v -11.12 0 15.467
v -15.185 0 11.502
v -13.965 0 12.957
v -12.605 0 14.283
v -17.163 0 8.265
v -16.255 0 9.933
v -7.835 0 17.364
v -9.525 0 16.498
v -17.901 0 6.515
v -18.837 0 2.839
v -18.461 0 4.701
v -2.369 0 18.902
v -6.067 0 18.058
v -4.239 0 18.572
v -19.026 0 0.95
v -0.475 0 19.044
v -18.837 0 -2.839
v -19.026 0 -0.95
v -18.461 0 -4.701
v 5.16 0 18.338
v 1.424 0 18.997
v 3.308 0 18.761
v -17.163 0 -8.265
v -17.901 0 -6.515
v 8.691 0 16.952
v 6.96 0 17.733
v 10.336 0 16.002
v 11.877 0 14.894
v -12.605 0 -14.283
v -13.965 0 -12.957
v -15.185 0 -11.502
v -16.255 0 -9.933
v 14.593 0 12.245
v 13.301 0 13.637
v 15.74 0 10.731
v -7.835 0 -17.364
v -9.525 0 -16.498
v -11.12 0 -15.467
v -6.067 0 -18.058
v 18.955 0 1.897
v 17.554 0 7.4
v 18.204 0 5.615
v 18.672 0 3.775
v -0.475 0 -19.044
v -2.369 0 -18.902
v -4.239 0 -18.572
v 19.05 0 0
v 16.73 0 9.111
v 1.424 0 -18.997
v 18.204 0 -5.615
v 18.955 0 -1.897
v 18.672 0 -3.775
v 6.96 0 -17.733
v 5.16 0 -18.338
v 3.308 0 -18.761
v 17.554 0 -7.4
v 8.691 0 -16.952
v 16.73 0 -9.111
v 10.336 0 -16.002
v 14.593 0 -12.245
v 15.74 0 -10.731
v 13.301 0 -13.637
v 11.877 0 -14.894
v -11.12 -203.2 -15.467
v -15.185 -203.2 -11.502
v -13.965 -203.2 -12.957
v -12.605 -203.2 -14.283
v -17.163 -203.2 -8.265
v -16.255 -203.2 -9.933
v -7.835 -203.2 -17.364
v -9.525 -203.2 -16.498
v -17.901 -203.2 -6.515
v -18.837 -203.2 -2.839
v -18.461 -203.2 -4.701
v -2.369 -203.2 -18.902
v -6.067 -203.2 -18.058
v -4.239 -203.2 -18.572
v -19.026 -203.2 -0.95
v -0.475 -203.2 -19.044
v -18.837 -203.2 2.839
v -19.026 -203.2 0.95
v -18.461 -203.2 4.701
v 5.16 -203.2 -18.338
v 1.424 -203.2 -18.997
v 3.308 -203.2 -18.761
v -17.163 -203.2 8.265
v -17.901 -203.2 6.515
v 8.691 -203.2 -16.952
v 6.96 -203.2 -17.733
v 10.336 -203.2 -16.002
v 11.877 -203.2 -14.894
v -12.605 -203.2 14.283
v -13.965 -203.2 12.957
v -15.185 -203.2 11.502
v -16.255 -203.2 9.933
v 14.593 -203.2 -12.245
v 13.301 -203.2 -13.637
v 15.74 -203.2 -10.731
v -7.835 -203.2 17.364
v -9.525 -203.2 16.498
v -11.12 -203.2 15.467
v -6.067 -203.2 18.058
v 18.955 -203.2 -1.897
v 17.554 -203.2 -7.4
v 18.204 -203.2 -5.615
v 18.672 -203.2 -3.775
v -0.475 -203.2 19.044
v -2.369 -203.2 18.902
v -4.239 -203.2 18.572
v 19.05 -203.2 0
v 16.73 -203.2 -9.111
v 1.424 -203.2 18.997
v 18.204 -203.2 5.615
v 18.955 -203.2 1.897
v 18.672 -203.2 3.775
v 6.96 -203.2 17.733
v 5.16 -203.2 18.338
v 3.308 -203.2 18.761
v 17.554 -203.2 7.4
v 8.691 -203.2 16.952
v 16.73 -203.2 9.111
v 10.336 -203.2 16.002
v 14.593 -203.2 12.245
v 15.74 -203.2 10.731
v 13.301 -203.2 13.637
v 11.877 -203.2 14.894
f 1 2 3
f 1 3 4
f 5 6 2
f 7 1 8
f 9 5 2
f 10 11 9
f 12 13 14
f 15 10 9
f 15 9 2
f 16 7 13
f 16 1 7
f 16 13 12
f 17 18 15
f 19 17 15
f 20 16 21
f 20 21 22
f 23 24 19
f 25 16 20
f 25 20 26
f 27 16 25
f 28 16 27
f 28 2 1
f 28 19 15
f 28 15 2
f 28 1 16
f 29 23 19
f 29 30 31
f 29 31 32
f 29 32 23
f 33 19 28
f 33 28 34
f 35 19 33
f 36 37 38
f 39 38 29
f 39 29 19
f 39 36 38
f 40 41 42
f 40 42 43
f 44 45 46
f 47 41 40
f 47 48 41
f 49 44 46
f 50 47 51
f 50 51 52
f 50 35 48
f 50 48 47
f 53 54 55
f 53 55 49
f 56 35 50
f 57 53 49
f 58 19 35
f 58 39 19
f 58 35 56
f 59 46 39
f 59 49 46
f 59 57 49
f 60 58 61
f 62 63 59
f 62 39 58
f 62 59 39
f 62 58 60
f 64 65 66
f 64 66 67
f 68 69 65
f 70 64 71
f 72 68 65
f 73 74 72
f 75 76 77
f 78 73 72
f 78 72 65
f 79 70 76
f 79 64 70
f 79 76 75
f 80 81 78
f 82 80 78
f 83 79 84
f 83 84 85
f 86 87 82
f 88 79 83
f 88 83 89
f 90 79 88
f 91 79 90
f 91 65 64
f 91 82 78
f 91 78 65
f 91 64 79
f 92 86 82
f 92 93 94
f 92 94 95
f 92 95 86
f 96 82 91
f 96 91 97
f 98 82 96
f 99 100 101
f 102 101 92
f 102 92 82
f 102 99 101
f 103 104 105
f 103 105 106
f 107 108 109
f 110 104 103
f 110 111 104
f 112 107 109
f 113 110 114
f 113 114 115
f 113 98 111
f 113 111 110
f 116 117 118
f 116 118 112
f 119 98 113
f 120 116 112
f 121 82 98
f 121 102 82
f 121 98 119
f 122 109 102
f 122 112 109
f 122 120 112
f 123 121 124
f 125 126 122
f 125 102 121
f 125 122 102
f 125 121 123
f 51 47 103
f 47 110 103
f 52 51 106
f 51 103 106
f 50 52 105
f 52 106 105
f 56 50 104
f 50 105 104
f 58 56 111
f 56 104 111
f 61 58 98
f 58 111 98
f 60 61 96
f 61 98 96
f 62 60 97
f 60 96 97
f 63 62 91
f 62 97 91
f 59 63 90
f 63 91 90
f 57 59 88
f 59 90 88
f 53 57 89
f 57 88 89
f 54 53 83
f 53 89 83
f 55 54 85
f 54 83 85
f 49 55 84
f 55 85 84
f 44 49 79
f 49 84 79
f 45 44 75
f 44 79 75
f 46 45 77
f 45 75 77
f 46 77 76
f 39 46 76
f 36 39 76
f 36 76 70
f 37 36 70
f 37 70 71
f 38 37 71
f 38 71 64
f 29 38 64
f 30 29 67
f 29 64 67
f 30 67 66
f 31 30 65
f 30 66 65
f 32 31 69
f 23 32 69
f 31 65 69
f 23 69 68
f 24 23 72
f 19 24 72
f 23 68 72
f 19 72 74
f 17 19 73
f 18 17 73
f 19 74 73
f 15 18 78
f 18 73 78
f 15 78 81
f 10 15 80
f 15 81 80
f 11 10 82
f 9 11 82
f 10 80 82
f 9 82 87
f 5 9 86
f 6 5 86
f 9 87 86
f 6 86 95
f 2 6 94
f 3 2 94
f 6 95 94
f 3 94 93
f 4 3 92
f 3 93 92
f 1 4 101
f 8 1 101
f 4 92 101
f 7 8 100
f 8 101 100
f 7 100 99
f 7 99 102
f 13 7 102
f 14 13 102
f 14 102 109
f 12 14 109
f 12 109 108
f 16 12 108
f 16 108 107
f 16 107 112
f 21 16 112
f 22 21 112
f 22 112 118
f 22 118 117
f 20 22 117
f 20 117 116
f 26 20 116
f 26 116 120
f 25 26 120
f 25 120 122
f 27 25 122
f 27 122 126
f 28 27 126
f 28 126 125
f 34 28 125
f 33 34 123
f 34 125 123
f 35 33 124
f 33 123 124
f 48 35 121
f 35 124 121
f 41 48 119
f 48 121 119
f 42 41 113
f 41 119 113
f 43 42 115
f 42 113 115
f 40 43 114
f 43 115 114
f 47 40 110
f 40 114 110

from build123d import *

# Parameters (mm, degrees)
F0_R      = 19.05
F0_R_2    = 15.875
F1_DEPTH  = 203.2
F1_FACE_R = 19.05
F2_DEPTH  = 25.4
F2_FACE_R = 19.05
F3_DEPTH  = 25.4


with BuildPart() as f1:
    # F0 (on Front) → F1 (new body)
    with BuildSketch(Plane.XZ):
        Circle(F0_R)
        Circle(F0_R_2, mode=Mode.SUBTRACT)
        Circle(F0_R_2)
    extrude(amount=F1_DEPTH)

    # F1_face (on face) → F2 (cut)
    with BuildSketch(Plane(origin=(0, 0, 0), x_dir=(1, 0, 0), z_dir=(0, 1, 0))):
        Circle(F1_FACE_R)
    extrude(amount=-F2_DEPTH, mode=Mode.SUBTRACT)

    # F2_face (on face) → F3 (join)
    with BuildSketch(Plane(origin=(0, -25.4, 0), x_dir=(1, 0, 0), z_dir=(0, 1, 0))):
        Circle(F2_FACE_R)
    extrude(amount=F3_DEPTH)


solid = f1.part
